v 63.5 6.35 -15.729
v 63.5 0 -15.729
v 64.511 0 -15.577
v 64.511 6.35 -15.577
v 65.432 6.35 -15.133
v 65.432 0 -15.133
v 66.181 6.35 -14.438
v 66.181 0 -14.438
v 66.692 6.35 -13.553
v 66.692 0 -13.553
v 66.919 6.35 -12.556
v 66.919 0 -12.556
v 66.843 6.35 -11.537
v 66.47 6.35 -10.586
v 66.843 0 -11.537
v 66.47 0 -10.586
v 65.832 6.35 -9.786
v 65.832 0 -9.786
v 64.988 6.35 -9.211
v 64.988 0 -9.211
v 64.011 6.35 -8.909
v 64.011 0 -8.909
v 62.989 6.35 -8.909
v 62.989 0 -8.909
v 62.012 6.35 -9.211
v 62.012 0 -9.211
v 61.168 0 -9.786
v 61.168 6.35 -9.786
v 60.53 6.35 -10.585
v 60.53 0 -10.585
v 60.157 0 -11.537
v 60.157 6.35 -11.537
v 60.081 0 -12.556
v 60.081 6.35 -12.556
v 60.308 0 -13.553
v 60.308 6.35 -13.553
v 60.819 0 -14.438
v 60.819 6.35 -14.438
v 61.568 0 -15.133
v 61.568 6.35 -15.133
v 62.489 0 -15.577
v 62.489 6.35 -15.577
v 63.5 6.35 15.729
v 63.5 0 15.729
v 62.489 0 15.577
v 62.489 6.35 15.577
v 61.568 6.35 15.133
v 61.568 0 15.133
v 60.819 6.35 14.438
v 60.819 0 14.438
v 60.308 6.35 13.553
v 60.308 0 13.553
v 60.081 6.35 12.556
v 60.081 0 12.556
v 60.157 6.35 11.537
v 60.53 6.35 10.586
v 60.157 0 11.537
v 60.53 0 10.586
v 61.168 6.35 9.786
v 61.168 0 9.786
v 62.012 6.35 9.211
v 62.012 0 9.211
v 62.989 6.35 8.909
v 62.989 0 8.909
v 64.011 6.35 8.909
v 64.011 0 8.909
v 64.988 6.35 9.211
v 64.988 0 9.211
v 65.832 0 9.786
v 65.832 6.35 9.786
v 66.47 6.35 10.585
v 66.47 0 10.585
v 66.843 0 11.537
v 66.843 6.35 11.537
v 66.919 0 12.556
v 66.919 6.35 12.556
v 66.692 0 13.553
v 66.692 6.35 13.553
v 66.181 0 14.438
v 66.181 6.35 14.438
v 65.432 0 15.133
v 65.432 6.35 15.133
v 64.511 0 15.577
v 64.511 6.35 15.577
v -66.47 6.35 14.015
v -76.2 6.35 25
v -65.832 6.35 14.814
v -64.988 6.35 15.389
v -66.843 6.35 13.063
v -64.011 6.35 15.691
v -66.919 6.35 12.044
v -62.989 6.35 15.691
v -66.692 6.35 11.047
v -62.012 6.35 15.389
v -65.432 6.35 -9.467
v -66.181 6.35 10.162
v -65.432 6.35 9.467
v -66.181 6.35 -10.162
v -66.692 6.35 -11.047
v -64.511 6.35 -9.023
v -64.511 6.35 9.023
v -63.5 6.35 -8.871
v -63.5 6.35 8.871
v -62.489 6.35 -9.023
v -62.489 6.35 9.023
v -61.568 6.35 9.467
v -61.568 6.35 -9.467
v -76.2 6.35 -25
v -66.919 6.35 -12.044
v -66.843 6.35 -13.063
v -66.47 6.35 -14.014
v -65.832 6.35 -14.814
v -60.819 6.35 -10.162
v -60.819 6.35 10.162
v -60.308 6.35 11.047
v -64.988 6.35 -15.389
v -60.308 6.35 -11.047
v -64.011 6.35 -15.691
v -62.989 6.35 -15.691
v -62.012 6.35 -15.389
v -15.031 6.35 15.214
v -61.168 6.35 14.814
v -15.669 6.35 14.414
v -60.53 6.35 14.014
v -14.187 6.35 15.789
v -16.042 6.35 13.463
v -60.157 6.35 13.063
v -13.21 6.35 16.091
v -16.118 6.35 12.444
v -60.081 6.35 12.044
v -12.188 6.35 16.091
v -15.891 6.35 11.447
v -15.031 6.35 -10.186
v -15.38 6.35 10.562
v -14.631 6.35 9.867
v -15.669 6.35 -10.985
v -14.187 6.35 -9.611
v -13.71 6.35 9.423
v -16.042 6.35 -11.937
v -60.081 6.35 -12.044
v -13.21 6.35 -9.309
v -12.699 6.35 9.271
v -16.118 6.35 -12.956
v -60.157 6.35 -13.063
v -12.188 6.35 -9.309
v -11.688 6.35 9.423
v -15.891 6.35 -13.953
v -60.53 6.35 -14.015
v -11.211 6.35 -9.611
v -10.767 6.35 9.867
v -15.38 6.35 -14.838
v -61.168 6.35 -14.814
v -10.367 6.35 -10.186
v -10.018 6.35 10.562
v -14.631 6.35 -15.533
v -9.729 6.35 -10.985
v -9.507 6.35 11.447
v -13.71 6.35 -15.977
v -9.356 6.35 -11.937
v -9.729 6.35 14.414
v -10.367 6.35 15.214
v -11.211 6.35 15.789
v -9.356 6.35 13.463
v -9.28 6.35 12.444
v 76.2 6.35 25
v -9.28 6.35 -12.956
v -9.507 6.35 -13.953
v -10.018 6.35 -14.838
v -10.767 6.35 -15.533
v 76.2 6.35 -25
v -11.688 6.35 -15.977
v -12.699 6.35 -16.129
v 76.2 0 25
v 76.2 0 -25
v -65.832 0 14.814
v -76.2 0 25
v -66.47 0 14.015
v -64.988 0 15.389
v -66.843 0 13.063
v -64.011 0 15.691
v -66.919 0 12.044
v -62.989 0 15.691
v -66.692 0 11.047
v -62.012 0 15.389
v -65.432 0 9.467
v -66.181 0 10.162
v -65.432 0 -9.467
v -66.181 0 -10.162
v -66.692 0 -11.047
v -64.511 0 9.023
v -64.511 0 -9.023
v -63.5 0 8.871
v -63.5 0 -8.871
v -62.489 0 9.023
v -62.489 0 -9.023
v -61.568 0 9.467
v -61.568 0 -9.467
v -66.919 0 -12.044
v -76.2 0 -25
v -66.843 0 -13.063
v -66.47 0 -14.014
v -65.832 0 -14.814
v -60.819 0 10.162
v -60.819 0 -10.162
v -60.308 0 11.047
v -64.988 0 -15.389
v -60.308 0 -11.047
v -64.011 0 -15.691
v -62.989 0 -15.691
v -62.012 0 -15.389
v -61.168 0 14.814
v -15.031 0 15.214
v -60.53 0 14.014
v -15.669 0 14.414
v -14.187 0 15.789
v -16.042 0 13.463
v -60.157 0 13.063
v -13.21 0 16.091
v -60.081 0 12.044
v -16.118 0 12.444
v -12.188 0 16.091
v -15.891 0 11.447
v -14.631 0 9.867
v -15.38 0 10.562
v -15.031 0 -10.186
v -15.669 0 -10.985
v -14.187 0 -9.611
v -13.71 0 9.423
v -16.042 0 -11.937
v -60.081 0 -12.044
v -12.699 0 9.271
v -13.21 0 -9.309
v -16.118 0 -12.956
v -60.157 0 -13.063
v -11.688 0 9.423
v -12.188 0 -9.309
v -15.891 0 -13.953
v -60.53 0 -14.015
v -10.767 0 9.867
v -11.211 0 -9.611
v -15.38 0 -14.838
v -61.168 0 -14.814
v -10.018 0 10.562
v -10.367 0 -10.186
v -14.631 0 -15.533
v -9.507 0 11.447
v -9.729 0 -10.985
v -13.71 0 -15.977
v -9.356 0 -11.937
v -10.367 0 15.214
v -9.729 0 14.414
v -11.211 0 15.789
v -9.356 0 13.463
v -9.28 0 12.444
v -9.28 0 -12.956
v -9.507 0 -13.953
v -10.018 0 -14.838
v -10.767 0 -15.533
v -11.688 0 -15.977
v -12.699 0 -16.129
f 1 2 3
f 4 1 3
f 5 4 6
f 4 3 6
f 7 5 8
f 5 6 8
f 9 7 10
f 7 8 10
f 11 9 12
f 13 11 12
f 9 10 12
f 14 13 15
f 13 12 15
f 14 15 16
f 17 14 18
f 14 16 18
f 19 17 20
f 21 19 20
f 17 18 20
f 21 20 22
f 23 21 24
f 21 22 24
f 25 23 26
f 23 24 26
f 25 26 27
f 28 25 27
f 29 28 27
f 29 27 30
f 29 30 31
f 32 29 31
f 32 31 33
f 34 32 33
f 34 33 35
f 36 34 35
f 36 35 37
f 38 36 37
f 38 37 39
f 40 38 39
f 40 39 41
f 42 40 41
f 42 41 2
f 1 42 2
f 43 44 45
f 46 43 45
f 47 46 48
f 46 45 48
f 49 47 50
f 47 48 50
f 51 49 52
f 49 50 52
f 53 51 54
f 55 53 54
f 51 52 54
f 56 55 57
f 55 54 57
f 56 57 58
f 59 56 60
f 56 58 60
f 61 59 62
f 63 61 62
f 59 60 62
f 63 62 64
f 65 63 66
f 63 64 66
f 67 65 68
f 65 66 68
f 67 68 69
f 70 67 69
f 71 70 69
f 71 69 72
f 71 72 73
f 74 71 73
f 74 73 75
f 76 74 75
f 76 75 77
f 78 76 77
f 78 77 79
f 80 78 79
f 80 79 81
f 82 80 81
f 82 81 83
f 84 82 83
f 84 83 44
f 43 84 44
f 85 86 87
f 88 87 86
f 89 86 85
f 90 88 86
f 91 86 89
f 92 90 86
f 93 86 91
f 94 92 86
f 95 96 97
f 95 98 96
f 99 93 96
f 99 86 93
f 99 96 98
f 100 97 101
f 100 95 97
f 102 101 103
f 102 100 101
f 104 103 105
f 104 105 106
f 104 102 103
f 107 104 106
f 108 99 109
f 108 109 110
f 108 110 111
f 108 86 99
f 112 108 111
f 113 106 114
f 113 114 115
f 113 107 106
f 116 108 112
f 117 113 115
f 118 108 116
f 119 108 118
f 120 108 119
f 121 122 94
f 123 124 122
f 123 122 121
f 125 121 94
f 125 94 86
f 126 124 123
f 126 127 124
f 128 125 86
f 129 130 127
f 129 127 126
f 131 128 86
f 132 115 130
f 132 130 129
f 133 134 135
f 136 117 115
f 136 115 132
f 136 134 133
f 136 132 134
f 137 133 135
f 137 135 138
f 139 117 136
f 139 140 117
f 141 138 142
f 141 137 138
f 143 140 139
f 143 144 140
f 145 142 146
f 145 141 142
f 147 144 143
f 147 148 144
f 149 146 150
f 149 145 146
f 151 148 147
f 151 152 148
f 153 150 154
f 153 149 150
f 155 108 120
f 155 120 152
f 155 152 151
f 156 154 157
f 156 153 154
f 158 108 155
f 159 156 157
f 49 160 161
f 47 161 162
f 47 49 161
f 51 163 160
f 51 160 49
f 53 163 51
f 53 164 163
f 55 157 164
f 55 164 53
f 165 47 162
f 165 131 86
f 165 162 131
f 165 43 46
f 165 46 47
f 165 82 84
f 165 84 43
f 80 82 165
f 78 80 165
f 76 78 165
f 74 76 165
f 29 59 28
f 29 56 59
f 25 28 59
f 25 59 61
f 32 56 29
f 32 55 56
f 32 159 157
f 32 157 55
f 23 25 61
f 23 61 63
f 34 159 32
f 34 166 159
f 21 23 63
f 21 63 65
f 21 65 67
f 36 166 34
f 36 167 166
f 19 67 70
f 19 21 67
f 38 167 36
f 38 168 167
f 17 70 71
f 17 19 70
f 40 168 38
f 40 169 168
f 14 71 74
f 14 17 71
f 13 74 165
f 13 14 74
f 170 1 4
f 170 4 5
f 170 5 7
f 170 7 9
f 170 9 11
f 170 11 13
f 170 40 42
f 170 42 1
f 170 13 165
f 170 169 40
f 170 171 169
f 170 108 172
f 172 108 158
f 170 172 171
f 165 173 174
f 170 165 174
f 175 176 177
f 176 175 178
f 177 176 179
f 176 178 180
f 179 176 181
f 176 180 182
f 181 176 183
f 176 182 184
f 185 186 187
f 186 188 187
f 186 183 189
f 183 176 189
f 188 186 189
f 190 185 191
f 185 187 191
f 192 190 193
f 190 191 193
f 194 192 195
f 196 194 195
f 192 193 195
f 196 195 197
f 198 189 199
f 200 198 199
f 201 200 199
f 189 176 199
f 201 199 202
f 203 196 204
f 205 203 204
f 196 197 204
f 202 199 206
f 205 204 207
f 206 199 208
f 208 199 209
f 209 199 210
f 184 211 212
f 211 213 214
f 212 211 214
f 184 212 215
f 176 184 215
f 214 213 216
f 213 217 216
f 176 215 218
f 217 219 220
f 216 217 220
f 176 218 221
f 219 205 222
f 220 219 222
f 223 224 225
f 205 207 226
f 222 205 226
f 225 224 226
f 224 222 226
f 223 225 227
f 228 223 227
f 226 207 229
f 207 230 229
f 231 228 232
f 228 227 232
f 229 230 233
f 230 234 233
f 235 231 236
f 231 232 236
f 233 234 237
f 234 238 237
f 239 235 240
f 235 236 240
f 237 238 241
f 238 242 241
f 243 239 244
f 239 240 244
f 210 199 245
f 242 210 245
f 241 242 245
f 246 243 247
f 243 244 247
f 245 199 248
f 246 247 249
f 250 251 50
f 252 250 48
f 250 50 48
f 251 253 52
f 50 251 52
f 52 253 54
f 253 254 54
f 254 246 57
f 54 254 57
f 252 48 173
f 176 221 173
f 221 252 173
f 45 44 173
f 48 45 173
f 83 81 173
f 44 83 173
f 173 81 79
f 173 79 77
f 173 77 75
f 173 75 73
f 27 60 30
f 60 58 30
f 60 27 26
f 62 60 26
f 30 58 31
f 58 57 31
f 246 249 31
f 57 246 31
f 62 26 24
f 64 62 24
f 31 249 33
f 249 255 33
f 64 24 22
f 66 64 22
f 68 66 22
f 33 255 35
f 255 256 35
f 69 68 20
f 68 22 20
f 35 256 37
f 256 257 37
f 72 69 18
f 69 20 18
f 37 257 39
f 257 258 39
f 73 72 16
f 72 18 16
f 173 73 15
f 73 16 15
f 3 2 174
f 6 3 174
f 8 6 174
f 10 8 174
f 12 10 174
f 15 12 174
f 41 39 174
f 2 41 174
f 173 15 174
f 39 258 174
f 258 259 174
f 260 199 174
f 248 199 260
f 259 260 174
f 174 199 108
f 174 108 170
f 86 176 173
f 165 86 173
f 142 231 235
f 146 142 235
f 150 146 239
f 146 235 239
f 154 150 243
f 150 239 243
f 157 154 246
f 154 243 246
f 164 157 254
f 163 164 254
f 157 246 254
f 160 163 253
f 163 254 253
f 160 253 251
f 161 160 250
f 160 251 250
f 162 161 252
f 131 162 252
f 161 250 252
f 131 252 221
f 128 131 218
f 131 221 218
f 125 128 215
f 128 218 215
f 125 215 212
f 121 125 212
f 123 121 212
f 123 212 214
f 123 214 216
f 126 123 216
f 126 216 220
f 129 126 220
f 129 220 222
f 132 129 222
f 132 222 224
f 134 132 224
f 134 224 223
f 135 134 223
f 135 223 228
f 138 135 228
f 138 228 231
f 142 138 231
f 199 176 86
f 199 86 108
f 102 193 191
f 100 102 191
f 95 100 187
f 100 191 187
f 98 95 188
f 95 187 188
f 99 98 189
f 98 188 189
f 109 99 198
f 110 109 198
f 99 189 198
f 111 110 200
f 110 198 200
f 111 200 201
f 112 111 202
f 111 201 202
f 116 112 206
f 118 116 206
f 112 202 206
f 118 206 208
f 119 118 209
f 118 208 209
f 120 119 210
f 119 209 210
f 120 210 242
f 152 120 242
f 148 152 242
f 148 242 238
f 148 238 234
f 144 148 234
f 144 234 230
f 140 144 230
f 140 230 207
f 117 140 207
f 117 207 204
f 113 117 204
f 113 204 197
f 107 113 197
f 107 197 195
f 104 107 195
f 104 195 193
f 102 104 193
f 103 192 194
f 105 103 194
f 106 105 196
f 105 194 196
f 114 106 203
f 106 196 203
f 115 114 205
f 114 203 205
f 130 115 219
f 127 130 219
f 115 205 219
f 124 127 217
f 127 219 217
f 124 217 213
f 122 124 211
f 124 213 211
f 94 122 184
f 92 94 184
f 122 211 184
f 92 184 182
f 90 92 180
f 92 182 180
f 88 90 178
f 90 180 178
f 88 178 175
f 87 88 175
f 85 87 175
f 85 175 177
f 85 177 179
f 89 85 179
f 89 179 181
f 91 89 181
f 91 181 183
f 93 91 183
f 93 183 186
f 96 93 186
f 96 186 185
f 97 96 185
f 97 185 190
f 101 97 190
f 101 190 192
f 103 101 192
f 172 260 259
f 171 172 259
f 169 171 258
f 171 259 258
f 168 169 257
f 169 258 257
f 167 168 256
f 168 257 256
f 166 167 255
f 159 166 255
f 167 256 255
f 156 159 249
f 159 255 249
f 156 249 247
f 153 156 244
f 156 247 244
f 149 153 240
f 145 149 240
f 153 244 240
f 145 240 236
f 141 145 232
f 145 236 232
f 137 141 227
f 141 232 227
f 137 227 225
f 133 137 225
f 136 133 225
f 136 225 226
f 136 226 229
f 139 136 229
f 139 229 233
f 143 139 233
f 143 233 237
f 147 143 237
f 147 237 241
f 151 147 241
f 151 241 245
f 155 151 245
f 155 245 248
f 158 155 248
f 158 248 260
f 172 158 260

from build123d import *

# Parameters (mm, degrees)
SKETCH1_W           = 152.4
SKETCH1_H           = 50
BOSS_EXTRUDE1_DEPTH = 6.35
CUT_EXTRUDE2_REACH  = 82.447
SKETCH3_R           = 3.429


with BuildPart() as part:
    # Sketch1 → Boss-Extrude1 (new body)
    with BuildSketch(Plane(origin=(0, 0, 0), x_dir=(1, 0, 0), z_dir=(0, 1, 0))):
        Rectangle(SKETCH1_W, SKETCH1_H)
    extrude(amount=BOSS_EXTRUDE1_DEPTH)

    # Sketch3 → Cut-Extrude2 (cut, up to next)
    with BuildSketch(Plane.XZ, mode=Mode.PRIVATE) as cut_extrude2_sk1:
        with Locations(Location((-63.5, 12.3, 0), (0, 0, 270))):
            Circle(SKETCH3_R)
    cut_extrude2_tool1 = extrude(cut_extrude2_sk1.sketch, amount=-CUT_EXTRUDE2_REACH, mode=Mode.PRIVATE) & part.part
    # Sketch3 → Cut-Extrude2 (cut, up to next)
    with BuildSketch(Plane.XZ, mode=Mode.PRIVATE) as cut_extrude2_sk2:
        with Locations(Location((-63.5, -12.3, 0), (0, 0, 90))):
            Circle(SKETCH3_R)
    cut_extrude2_tool2 = extrude(cut_extrude2_sk2.sketch, amount=-CUT_EXTRUDE2_REACH, mode=Mode.PRIVATE) & part.part
    # Sketch3 → Cut-Extrude2 (cut, up to next)
    with BuildSketch(Plane.XZ, mode=Mode.PRIVATE) as cut_extrude2_sk3:
        with Locations(Location((63.5, 12.3, 0), (0, 0, 90))):
            Circle(SKETCH3_R)
    cut_extrude2_tool3 = extrude(cut_extrude2_sk3.sketch, amount=-CUT_EXTRUDE2_REACH, mode=Mode.PRIVATE) & part.part
    # Sketch3 → Cut-Extrude2 (cut, up to next)
    with BuildSketch(Plane.XZ, mode=Mode.PRIVATE) as cut_extrude2_sk4:
        with Locations(Location((63.5, -12.3, 0), (0, 0, 270))):
            Circle(SKETCH3_R)
    cut_extrude2_tool4 = extrude(cut_extrude2_sk4.sketch, amount=-CUT_EXTRUDE2_REACH, mode=Mode.PRIVATE) & part.part
    # Sketch3 → Cut-Extrude2 (cut, up to next)
    with BuildSketch(Plane.XZ, mode=Mode.PRIVATE) as cut_extrude2_sk5:
        with Locations(Location((-12.698950153, 12.699994489, 0), (0, 0, 270))):
            Circle(SKETCH3_R)
    cut_extrude2_tool5 = extrude(cut_extrude2_sk5.sketch, amount=-CUT_EXTRUDE2_REACH, mode=Mode.PRIVATE) & part.part
    # Sketch3 → Cut-Extrude2 (cut, up to next)
    with BuildSketch(Plane.XZ, mode=Mode.PRIVATE) as cut_extrude2_sk6:
        with Locations(Location((-12.698950153, -12.699994489, 0), (0, 0, 270))):
            Circle(SKETCH3_R)
    cut_extrude2_tool6 = extrude(cut_extrude2_sk6.sketch, amount=-CUT_EXTRUDE2_REACH, mode=Mode.PRIVATE) & part.part
    add(cut_extrude2_tool1.solids().sort_by_distance((-63.5, 0, 12.3))[0], mode=Mode.SUBTRACT)
    add(cut_extrude2_tool2.solids().sort_by_distance((-63.5, 0, -12.3))[0], mode=Mode.SUBTRACT)
    add(cut_extrude2_tool3.solids().sort_by_distance((63.5, 0, 12.3))[0], mode=Mode.SUBTRACT)
    add(cut_extrude2_tool4.solids().sort_by_distance((63.5, 0, -12.3))[0], mode=Mode.SUBTRACT)
    add(cut_extrude2_tool5.solids().sort_by_distance((-12.69895, 0, 12.699994))[0], mode=Mode.SUBTRACT)
    add(cut_extrude2_tool6.solids().sort_by_distance((-12.69895, 0, -12.699994))[0], mode=Mode.SUBTRACT)


solid = part.part
